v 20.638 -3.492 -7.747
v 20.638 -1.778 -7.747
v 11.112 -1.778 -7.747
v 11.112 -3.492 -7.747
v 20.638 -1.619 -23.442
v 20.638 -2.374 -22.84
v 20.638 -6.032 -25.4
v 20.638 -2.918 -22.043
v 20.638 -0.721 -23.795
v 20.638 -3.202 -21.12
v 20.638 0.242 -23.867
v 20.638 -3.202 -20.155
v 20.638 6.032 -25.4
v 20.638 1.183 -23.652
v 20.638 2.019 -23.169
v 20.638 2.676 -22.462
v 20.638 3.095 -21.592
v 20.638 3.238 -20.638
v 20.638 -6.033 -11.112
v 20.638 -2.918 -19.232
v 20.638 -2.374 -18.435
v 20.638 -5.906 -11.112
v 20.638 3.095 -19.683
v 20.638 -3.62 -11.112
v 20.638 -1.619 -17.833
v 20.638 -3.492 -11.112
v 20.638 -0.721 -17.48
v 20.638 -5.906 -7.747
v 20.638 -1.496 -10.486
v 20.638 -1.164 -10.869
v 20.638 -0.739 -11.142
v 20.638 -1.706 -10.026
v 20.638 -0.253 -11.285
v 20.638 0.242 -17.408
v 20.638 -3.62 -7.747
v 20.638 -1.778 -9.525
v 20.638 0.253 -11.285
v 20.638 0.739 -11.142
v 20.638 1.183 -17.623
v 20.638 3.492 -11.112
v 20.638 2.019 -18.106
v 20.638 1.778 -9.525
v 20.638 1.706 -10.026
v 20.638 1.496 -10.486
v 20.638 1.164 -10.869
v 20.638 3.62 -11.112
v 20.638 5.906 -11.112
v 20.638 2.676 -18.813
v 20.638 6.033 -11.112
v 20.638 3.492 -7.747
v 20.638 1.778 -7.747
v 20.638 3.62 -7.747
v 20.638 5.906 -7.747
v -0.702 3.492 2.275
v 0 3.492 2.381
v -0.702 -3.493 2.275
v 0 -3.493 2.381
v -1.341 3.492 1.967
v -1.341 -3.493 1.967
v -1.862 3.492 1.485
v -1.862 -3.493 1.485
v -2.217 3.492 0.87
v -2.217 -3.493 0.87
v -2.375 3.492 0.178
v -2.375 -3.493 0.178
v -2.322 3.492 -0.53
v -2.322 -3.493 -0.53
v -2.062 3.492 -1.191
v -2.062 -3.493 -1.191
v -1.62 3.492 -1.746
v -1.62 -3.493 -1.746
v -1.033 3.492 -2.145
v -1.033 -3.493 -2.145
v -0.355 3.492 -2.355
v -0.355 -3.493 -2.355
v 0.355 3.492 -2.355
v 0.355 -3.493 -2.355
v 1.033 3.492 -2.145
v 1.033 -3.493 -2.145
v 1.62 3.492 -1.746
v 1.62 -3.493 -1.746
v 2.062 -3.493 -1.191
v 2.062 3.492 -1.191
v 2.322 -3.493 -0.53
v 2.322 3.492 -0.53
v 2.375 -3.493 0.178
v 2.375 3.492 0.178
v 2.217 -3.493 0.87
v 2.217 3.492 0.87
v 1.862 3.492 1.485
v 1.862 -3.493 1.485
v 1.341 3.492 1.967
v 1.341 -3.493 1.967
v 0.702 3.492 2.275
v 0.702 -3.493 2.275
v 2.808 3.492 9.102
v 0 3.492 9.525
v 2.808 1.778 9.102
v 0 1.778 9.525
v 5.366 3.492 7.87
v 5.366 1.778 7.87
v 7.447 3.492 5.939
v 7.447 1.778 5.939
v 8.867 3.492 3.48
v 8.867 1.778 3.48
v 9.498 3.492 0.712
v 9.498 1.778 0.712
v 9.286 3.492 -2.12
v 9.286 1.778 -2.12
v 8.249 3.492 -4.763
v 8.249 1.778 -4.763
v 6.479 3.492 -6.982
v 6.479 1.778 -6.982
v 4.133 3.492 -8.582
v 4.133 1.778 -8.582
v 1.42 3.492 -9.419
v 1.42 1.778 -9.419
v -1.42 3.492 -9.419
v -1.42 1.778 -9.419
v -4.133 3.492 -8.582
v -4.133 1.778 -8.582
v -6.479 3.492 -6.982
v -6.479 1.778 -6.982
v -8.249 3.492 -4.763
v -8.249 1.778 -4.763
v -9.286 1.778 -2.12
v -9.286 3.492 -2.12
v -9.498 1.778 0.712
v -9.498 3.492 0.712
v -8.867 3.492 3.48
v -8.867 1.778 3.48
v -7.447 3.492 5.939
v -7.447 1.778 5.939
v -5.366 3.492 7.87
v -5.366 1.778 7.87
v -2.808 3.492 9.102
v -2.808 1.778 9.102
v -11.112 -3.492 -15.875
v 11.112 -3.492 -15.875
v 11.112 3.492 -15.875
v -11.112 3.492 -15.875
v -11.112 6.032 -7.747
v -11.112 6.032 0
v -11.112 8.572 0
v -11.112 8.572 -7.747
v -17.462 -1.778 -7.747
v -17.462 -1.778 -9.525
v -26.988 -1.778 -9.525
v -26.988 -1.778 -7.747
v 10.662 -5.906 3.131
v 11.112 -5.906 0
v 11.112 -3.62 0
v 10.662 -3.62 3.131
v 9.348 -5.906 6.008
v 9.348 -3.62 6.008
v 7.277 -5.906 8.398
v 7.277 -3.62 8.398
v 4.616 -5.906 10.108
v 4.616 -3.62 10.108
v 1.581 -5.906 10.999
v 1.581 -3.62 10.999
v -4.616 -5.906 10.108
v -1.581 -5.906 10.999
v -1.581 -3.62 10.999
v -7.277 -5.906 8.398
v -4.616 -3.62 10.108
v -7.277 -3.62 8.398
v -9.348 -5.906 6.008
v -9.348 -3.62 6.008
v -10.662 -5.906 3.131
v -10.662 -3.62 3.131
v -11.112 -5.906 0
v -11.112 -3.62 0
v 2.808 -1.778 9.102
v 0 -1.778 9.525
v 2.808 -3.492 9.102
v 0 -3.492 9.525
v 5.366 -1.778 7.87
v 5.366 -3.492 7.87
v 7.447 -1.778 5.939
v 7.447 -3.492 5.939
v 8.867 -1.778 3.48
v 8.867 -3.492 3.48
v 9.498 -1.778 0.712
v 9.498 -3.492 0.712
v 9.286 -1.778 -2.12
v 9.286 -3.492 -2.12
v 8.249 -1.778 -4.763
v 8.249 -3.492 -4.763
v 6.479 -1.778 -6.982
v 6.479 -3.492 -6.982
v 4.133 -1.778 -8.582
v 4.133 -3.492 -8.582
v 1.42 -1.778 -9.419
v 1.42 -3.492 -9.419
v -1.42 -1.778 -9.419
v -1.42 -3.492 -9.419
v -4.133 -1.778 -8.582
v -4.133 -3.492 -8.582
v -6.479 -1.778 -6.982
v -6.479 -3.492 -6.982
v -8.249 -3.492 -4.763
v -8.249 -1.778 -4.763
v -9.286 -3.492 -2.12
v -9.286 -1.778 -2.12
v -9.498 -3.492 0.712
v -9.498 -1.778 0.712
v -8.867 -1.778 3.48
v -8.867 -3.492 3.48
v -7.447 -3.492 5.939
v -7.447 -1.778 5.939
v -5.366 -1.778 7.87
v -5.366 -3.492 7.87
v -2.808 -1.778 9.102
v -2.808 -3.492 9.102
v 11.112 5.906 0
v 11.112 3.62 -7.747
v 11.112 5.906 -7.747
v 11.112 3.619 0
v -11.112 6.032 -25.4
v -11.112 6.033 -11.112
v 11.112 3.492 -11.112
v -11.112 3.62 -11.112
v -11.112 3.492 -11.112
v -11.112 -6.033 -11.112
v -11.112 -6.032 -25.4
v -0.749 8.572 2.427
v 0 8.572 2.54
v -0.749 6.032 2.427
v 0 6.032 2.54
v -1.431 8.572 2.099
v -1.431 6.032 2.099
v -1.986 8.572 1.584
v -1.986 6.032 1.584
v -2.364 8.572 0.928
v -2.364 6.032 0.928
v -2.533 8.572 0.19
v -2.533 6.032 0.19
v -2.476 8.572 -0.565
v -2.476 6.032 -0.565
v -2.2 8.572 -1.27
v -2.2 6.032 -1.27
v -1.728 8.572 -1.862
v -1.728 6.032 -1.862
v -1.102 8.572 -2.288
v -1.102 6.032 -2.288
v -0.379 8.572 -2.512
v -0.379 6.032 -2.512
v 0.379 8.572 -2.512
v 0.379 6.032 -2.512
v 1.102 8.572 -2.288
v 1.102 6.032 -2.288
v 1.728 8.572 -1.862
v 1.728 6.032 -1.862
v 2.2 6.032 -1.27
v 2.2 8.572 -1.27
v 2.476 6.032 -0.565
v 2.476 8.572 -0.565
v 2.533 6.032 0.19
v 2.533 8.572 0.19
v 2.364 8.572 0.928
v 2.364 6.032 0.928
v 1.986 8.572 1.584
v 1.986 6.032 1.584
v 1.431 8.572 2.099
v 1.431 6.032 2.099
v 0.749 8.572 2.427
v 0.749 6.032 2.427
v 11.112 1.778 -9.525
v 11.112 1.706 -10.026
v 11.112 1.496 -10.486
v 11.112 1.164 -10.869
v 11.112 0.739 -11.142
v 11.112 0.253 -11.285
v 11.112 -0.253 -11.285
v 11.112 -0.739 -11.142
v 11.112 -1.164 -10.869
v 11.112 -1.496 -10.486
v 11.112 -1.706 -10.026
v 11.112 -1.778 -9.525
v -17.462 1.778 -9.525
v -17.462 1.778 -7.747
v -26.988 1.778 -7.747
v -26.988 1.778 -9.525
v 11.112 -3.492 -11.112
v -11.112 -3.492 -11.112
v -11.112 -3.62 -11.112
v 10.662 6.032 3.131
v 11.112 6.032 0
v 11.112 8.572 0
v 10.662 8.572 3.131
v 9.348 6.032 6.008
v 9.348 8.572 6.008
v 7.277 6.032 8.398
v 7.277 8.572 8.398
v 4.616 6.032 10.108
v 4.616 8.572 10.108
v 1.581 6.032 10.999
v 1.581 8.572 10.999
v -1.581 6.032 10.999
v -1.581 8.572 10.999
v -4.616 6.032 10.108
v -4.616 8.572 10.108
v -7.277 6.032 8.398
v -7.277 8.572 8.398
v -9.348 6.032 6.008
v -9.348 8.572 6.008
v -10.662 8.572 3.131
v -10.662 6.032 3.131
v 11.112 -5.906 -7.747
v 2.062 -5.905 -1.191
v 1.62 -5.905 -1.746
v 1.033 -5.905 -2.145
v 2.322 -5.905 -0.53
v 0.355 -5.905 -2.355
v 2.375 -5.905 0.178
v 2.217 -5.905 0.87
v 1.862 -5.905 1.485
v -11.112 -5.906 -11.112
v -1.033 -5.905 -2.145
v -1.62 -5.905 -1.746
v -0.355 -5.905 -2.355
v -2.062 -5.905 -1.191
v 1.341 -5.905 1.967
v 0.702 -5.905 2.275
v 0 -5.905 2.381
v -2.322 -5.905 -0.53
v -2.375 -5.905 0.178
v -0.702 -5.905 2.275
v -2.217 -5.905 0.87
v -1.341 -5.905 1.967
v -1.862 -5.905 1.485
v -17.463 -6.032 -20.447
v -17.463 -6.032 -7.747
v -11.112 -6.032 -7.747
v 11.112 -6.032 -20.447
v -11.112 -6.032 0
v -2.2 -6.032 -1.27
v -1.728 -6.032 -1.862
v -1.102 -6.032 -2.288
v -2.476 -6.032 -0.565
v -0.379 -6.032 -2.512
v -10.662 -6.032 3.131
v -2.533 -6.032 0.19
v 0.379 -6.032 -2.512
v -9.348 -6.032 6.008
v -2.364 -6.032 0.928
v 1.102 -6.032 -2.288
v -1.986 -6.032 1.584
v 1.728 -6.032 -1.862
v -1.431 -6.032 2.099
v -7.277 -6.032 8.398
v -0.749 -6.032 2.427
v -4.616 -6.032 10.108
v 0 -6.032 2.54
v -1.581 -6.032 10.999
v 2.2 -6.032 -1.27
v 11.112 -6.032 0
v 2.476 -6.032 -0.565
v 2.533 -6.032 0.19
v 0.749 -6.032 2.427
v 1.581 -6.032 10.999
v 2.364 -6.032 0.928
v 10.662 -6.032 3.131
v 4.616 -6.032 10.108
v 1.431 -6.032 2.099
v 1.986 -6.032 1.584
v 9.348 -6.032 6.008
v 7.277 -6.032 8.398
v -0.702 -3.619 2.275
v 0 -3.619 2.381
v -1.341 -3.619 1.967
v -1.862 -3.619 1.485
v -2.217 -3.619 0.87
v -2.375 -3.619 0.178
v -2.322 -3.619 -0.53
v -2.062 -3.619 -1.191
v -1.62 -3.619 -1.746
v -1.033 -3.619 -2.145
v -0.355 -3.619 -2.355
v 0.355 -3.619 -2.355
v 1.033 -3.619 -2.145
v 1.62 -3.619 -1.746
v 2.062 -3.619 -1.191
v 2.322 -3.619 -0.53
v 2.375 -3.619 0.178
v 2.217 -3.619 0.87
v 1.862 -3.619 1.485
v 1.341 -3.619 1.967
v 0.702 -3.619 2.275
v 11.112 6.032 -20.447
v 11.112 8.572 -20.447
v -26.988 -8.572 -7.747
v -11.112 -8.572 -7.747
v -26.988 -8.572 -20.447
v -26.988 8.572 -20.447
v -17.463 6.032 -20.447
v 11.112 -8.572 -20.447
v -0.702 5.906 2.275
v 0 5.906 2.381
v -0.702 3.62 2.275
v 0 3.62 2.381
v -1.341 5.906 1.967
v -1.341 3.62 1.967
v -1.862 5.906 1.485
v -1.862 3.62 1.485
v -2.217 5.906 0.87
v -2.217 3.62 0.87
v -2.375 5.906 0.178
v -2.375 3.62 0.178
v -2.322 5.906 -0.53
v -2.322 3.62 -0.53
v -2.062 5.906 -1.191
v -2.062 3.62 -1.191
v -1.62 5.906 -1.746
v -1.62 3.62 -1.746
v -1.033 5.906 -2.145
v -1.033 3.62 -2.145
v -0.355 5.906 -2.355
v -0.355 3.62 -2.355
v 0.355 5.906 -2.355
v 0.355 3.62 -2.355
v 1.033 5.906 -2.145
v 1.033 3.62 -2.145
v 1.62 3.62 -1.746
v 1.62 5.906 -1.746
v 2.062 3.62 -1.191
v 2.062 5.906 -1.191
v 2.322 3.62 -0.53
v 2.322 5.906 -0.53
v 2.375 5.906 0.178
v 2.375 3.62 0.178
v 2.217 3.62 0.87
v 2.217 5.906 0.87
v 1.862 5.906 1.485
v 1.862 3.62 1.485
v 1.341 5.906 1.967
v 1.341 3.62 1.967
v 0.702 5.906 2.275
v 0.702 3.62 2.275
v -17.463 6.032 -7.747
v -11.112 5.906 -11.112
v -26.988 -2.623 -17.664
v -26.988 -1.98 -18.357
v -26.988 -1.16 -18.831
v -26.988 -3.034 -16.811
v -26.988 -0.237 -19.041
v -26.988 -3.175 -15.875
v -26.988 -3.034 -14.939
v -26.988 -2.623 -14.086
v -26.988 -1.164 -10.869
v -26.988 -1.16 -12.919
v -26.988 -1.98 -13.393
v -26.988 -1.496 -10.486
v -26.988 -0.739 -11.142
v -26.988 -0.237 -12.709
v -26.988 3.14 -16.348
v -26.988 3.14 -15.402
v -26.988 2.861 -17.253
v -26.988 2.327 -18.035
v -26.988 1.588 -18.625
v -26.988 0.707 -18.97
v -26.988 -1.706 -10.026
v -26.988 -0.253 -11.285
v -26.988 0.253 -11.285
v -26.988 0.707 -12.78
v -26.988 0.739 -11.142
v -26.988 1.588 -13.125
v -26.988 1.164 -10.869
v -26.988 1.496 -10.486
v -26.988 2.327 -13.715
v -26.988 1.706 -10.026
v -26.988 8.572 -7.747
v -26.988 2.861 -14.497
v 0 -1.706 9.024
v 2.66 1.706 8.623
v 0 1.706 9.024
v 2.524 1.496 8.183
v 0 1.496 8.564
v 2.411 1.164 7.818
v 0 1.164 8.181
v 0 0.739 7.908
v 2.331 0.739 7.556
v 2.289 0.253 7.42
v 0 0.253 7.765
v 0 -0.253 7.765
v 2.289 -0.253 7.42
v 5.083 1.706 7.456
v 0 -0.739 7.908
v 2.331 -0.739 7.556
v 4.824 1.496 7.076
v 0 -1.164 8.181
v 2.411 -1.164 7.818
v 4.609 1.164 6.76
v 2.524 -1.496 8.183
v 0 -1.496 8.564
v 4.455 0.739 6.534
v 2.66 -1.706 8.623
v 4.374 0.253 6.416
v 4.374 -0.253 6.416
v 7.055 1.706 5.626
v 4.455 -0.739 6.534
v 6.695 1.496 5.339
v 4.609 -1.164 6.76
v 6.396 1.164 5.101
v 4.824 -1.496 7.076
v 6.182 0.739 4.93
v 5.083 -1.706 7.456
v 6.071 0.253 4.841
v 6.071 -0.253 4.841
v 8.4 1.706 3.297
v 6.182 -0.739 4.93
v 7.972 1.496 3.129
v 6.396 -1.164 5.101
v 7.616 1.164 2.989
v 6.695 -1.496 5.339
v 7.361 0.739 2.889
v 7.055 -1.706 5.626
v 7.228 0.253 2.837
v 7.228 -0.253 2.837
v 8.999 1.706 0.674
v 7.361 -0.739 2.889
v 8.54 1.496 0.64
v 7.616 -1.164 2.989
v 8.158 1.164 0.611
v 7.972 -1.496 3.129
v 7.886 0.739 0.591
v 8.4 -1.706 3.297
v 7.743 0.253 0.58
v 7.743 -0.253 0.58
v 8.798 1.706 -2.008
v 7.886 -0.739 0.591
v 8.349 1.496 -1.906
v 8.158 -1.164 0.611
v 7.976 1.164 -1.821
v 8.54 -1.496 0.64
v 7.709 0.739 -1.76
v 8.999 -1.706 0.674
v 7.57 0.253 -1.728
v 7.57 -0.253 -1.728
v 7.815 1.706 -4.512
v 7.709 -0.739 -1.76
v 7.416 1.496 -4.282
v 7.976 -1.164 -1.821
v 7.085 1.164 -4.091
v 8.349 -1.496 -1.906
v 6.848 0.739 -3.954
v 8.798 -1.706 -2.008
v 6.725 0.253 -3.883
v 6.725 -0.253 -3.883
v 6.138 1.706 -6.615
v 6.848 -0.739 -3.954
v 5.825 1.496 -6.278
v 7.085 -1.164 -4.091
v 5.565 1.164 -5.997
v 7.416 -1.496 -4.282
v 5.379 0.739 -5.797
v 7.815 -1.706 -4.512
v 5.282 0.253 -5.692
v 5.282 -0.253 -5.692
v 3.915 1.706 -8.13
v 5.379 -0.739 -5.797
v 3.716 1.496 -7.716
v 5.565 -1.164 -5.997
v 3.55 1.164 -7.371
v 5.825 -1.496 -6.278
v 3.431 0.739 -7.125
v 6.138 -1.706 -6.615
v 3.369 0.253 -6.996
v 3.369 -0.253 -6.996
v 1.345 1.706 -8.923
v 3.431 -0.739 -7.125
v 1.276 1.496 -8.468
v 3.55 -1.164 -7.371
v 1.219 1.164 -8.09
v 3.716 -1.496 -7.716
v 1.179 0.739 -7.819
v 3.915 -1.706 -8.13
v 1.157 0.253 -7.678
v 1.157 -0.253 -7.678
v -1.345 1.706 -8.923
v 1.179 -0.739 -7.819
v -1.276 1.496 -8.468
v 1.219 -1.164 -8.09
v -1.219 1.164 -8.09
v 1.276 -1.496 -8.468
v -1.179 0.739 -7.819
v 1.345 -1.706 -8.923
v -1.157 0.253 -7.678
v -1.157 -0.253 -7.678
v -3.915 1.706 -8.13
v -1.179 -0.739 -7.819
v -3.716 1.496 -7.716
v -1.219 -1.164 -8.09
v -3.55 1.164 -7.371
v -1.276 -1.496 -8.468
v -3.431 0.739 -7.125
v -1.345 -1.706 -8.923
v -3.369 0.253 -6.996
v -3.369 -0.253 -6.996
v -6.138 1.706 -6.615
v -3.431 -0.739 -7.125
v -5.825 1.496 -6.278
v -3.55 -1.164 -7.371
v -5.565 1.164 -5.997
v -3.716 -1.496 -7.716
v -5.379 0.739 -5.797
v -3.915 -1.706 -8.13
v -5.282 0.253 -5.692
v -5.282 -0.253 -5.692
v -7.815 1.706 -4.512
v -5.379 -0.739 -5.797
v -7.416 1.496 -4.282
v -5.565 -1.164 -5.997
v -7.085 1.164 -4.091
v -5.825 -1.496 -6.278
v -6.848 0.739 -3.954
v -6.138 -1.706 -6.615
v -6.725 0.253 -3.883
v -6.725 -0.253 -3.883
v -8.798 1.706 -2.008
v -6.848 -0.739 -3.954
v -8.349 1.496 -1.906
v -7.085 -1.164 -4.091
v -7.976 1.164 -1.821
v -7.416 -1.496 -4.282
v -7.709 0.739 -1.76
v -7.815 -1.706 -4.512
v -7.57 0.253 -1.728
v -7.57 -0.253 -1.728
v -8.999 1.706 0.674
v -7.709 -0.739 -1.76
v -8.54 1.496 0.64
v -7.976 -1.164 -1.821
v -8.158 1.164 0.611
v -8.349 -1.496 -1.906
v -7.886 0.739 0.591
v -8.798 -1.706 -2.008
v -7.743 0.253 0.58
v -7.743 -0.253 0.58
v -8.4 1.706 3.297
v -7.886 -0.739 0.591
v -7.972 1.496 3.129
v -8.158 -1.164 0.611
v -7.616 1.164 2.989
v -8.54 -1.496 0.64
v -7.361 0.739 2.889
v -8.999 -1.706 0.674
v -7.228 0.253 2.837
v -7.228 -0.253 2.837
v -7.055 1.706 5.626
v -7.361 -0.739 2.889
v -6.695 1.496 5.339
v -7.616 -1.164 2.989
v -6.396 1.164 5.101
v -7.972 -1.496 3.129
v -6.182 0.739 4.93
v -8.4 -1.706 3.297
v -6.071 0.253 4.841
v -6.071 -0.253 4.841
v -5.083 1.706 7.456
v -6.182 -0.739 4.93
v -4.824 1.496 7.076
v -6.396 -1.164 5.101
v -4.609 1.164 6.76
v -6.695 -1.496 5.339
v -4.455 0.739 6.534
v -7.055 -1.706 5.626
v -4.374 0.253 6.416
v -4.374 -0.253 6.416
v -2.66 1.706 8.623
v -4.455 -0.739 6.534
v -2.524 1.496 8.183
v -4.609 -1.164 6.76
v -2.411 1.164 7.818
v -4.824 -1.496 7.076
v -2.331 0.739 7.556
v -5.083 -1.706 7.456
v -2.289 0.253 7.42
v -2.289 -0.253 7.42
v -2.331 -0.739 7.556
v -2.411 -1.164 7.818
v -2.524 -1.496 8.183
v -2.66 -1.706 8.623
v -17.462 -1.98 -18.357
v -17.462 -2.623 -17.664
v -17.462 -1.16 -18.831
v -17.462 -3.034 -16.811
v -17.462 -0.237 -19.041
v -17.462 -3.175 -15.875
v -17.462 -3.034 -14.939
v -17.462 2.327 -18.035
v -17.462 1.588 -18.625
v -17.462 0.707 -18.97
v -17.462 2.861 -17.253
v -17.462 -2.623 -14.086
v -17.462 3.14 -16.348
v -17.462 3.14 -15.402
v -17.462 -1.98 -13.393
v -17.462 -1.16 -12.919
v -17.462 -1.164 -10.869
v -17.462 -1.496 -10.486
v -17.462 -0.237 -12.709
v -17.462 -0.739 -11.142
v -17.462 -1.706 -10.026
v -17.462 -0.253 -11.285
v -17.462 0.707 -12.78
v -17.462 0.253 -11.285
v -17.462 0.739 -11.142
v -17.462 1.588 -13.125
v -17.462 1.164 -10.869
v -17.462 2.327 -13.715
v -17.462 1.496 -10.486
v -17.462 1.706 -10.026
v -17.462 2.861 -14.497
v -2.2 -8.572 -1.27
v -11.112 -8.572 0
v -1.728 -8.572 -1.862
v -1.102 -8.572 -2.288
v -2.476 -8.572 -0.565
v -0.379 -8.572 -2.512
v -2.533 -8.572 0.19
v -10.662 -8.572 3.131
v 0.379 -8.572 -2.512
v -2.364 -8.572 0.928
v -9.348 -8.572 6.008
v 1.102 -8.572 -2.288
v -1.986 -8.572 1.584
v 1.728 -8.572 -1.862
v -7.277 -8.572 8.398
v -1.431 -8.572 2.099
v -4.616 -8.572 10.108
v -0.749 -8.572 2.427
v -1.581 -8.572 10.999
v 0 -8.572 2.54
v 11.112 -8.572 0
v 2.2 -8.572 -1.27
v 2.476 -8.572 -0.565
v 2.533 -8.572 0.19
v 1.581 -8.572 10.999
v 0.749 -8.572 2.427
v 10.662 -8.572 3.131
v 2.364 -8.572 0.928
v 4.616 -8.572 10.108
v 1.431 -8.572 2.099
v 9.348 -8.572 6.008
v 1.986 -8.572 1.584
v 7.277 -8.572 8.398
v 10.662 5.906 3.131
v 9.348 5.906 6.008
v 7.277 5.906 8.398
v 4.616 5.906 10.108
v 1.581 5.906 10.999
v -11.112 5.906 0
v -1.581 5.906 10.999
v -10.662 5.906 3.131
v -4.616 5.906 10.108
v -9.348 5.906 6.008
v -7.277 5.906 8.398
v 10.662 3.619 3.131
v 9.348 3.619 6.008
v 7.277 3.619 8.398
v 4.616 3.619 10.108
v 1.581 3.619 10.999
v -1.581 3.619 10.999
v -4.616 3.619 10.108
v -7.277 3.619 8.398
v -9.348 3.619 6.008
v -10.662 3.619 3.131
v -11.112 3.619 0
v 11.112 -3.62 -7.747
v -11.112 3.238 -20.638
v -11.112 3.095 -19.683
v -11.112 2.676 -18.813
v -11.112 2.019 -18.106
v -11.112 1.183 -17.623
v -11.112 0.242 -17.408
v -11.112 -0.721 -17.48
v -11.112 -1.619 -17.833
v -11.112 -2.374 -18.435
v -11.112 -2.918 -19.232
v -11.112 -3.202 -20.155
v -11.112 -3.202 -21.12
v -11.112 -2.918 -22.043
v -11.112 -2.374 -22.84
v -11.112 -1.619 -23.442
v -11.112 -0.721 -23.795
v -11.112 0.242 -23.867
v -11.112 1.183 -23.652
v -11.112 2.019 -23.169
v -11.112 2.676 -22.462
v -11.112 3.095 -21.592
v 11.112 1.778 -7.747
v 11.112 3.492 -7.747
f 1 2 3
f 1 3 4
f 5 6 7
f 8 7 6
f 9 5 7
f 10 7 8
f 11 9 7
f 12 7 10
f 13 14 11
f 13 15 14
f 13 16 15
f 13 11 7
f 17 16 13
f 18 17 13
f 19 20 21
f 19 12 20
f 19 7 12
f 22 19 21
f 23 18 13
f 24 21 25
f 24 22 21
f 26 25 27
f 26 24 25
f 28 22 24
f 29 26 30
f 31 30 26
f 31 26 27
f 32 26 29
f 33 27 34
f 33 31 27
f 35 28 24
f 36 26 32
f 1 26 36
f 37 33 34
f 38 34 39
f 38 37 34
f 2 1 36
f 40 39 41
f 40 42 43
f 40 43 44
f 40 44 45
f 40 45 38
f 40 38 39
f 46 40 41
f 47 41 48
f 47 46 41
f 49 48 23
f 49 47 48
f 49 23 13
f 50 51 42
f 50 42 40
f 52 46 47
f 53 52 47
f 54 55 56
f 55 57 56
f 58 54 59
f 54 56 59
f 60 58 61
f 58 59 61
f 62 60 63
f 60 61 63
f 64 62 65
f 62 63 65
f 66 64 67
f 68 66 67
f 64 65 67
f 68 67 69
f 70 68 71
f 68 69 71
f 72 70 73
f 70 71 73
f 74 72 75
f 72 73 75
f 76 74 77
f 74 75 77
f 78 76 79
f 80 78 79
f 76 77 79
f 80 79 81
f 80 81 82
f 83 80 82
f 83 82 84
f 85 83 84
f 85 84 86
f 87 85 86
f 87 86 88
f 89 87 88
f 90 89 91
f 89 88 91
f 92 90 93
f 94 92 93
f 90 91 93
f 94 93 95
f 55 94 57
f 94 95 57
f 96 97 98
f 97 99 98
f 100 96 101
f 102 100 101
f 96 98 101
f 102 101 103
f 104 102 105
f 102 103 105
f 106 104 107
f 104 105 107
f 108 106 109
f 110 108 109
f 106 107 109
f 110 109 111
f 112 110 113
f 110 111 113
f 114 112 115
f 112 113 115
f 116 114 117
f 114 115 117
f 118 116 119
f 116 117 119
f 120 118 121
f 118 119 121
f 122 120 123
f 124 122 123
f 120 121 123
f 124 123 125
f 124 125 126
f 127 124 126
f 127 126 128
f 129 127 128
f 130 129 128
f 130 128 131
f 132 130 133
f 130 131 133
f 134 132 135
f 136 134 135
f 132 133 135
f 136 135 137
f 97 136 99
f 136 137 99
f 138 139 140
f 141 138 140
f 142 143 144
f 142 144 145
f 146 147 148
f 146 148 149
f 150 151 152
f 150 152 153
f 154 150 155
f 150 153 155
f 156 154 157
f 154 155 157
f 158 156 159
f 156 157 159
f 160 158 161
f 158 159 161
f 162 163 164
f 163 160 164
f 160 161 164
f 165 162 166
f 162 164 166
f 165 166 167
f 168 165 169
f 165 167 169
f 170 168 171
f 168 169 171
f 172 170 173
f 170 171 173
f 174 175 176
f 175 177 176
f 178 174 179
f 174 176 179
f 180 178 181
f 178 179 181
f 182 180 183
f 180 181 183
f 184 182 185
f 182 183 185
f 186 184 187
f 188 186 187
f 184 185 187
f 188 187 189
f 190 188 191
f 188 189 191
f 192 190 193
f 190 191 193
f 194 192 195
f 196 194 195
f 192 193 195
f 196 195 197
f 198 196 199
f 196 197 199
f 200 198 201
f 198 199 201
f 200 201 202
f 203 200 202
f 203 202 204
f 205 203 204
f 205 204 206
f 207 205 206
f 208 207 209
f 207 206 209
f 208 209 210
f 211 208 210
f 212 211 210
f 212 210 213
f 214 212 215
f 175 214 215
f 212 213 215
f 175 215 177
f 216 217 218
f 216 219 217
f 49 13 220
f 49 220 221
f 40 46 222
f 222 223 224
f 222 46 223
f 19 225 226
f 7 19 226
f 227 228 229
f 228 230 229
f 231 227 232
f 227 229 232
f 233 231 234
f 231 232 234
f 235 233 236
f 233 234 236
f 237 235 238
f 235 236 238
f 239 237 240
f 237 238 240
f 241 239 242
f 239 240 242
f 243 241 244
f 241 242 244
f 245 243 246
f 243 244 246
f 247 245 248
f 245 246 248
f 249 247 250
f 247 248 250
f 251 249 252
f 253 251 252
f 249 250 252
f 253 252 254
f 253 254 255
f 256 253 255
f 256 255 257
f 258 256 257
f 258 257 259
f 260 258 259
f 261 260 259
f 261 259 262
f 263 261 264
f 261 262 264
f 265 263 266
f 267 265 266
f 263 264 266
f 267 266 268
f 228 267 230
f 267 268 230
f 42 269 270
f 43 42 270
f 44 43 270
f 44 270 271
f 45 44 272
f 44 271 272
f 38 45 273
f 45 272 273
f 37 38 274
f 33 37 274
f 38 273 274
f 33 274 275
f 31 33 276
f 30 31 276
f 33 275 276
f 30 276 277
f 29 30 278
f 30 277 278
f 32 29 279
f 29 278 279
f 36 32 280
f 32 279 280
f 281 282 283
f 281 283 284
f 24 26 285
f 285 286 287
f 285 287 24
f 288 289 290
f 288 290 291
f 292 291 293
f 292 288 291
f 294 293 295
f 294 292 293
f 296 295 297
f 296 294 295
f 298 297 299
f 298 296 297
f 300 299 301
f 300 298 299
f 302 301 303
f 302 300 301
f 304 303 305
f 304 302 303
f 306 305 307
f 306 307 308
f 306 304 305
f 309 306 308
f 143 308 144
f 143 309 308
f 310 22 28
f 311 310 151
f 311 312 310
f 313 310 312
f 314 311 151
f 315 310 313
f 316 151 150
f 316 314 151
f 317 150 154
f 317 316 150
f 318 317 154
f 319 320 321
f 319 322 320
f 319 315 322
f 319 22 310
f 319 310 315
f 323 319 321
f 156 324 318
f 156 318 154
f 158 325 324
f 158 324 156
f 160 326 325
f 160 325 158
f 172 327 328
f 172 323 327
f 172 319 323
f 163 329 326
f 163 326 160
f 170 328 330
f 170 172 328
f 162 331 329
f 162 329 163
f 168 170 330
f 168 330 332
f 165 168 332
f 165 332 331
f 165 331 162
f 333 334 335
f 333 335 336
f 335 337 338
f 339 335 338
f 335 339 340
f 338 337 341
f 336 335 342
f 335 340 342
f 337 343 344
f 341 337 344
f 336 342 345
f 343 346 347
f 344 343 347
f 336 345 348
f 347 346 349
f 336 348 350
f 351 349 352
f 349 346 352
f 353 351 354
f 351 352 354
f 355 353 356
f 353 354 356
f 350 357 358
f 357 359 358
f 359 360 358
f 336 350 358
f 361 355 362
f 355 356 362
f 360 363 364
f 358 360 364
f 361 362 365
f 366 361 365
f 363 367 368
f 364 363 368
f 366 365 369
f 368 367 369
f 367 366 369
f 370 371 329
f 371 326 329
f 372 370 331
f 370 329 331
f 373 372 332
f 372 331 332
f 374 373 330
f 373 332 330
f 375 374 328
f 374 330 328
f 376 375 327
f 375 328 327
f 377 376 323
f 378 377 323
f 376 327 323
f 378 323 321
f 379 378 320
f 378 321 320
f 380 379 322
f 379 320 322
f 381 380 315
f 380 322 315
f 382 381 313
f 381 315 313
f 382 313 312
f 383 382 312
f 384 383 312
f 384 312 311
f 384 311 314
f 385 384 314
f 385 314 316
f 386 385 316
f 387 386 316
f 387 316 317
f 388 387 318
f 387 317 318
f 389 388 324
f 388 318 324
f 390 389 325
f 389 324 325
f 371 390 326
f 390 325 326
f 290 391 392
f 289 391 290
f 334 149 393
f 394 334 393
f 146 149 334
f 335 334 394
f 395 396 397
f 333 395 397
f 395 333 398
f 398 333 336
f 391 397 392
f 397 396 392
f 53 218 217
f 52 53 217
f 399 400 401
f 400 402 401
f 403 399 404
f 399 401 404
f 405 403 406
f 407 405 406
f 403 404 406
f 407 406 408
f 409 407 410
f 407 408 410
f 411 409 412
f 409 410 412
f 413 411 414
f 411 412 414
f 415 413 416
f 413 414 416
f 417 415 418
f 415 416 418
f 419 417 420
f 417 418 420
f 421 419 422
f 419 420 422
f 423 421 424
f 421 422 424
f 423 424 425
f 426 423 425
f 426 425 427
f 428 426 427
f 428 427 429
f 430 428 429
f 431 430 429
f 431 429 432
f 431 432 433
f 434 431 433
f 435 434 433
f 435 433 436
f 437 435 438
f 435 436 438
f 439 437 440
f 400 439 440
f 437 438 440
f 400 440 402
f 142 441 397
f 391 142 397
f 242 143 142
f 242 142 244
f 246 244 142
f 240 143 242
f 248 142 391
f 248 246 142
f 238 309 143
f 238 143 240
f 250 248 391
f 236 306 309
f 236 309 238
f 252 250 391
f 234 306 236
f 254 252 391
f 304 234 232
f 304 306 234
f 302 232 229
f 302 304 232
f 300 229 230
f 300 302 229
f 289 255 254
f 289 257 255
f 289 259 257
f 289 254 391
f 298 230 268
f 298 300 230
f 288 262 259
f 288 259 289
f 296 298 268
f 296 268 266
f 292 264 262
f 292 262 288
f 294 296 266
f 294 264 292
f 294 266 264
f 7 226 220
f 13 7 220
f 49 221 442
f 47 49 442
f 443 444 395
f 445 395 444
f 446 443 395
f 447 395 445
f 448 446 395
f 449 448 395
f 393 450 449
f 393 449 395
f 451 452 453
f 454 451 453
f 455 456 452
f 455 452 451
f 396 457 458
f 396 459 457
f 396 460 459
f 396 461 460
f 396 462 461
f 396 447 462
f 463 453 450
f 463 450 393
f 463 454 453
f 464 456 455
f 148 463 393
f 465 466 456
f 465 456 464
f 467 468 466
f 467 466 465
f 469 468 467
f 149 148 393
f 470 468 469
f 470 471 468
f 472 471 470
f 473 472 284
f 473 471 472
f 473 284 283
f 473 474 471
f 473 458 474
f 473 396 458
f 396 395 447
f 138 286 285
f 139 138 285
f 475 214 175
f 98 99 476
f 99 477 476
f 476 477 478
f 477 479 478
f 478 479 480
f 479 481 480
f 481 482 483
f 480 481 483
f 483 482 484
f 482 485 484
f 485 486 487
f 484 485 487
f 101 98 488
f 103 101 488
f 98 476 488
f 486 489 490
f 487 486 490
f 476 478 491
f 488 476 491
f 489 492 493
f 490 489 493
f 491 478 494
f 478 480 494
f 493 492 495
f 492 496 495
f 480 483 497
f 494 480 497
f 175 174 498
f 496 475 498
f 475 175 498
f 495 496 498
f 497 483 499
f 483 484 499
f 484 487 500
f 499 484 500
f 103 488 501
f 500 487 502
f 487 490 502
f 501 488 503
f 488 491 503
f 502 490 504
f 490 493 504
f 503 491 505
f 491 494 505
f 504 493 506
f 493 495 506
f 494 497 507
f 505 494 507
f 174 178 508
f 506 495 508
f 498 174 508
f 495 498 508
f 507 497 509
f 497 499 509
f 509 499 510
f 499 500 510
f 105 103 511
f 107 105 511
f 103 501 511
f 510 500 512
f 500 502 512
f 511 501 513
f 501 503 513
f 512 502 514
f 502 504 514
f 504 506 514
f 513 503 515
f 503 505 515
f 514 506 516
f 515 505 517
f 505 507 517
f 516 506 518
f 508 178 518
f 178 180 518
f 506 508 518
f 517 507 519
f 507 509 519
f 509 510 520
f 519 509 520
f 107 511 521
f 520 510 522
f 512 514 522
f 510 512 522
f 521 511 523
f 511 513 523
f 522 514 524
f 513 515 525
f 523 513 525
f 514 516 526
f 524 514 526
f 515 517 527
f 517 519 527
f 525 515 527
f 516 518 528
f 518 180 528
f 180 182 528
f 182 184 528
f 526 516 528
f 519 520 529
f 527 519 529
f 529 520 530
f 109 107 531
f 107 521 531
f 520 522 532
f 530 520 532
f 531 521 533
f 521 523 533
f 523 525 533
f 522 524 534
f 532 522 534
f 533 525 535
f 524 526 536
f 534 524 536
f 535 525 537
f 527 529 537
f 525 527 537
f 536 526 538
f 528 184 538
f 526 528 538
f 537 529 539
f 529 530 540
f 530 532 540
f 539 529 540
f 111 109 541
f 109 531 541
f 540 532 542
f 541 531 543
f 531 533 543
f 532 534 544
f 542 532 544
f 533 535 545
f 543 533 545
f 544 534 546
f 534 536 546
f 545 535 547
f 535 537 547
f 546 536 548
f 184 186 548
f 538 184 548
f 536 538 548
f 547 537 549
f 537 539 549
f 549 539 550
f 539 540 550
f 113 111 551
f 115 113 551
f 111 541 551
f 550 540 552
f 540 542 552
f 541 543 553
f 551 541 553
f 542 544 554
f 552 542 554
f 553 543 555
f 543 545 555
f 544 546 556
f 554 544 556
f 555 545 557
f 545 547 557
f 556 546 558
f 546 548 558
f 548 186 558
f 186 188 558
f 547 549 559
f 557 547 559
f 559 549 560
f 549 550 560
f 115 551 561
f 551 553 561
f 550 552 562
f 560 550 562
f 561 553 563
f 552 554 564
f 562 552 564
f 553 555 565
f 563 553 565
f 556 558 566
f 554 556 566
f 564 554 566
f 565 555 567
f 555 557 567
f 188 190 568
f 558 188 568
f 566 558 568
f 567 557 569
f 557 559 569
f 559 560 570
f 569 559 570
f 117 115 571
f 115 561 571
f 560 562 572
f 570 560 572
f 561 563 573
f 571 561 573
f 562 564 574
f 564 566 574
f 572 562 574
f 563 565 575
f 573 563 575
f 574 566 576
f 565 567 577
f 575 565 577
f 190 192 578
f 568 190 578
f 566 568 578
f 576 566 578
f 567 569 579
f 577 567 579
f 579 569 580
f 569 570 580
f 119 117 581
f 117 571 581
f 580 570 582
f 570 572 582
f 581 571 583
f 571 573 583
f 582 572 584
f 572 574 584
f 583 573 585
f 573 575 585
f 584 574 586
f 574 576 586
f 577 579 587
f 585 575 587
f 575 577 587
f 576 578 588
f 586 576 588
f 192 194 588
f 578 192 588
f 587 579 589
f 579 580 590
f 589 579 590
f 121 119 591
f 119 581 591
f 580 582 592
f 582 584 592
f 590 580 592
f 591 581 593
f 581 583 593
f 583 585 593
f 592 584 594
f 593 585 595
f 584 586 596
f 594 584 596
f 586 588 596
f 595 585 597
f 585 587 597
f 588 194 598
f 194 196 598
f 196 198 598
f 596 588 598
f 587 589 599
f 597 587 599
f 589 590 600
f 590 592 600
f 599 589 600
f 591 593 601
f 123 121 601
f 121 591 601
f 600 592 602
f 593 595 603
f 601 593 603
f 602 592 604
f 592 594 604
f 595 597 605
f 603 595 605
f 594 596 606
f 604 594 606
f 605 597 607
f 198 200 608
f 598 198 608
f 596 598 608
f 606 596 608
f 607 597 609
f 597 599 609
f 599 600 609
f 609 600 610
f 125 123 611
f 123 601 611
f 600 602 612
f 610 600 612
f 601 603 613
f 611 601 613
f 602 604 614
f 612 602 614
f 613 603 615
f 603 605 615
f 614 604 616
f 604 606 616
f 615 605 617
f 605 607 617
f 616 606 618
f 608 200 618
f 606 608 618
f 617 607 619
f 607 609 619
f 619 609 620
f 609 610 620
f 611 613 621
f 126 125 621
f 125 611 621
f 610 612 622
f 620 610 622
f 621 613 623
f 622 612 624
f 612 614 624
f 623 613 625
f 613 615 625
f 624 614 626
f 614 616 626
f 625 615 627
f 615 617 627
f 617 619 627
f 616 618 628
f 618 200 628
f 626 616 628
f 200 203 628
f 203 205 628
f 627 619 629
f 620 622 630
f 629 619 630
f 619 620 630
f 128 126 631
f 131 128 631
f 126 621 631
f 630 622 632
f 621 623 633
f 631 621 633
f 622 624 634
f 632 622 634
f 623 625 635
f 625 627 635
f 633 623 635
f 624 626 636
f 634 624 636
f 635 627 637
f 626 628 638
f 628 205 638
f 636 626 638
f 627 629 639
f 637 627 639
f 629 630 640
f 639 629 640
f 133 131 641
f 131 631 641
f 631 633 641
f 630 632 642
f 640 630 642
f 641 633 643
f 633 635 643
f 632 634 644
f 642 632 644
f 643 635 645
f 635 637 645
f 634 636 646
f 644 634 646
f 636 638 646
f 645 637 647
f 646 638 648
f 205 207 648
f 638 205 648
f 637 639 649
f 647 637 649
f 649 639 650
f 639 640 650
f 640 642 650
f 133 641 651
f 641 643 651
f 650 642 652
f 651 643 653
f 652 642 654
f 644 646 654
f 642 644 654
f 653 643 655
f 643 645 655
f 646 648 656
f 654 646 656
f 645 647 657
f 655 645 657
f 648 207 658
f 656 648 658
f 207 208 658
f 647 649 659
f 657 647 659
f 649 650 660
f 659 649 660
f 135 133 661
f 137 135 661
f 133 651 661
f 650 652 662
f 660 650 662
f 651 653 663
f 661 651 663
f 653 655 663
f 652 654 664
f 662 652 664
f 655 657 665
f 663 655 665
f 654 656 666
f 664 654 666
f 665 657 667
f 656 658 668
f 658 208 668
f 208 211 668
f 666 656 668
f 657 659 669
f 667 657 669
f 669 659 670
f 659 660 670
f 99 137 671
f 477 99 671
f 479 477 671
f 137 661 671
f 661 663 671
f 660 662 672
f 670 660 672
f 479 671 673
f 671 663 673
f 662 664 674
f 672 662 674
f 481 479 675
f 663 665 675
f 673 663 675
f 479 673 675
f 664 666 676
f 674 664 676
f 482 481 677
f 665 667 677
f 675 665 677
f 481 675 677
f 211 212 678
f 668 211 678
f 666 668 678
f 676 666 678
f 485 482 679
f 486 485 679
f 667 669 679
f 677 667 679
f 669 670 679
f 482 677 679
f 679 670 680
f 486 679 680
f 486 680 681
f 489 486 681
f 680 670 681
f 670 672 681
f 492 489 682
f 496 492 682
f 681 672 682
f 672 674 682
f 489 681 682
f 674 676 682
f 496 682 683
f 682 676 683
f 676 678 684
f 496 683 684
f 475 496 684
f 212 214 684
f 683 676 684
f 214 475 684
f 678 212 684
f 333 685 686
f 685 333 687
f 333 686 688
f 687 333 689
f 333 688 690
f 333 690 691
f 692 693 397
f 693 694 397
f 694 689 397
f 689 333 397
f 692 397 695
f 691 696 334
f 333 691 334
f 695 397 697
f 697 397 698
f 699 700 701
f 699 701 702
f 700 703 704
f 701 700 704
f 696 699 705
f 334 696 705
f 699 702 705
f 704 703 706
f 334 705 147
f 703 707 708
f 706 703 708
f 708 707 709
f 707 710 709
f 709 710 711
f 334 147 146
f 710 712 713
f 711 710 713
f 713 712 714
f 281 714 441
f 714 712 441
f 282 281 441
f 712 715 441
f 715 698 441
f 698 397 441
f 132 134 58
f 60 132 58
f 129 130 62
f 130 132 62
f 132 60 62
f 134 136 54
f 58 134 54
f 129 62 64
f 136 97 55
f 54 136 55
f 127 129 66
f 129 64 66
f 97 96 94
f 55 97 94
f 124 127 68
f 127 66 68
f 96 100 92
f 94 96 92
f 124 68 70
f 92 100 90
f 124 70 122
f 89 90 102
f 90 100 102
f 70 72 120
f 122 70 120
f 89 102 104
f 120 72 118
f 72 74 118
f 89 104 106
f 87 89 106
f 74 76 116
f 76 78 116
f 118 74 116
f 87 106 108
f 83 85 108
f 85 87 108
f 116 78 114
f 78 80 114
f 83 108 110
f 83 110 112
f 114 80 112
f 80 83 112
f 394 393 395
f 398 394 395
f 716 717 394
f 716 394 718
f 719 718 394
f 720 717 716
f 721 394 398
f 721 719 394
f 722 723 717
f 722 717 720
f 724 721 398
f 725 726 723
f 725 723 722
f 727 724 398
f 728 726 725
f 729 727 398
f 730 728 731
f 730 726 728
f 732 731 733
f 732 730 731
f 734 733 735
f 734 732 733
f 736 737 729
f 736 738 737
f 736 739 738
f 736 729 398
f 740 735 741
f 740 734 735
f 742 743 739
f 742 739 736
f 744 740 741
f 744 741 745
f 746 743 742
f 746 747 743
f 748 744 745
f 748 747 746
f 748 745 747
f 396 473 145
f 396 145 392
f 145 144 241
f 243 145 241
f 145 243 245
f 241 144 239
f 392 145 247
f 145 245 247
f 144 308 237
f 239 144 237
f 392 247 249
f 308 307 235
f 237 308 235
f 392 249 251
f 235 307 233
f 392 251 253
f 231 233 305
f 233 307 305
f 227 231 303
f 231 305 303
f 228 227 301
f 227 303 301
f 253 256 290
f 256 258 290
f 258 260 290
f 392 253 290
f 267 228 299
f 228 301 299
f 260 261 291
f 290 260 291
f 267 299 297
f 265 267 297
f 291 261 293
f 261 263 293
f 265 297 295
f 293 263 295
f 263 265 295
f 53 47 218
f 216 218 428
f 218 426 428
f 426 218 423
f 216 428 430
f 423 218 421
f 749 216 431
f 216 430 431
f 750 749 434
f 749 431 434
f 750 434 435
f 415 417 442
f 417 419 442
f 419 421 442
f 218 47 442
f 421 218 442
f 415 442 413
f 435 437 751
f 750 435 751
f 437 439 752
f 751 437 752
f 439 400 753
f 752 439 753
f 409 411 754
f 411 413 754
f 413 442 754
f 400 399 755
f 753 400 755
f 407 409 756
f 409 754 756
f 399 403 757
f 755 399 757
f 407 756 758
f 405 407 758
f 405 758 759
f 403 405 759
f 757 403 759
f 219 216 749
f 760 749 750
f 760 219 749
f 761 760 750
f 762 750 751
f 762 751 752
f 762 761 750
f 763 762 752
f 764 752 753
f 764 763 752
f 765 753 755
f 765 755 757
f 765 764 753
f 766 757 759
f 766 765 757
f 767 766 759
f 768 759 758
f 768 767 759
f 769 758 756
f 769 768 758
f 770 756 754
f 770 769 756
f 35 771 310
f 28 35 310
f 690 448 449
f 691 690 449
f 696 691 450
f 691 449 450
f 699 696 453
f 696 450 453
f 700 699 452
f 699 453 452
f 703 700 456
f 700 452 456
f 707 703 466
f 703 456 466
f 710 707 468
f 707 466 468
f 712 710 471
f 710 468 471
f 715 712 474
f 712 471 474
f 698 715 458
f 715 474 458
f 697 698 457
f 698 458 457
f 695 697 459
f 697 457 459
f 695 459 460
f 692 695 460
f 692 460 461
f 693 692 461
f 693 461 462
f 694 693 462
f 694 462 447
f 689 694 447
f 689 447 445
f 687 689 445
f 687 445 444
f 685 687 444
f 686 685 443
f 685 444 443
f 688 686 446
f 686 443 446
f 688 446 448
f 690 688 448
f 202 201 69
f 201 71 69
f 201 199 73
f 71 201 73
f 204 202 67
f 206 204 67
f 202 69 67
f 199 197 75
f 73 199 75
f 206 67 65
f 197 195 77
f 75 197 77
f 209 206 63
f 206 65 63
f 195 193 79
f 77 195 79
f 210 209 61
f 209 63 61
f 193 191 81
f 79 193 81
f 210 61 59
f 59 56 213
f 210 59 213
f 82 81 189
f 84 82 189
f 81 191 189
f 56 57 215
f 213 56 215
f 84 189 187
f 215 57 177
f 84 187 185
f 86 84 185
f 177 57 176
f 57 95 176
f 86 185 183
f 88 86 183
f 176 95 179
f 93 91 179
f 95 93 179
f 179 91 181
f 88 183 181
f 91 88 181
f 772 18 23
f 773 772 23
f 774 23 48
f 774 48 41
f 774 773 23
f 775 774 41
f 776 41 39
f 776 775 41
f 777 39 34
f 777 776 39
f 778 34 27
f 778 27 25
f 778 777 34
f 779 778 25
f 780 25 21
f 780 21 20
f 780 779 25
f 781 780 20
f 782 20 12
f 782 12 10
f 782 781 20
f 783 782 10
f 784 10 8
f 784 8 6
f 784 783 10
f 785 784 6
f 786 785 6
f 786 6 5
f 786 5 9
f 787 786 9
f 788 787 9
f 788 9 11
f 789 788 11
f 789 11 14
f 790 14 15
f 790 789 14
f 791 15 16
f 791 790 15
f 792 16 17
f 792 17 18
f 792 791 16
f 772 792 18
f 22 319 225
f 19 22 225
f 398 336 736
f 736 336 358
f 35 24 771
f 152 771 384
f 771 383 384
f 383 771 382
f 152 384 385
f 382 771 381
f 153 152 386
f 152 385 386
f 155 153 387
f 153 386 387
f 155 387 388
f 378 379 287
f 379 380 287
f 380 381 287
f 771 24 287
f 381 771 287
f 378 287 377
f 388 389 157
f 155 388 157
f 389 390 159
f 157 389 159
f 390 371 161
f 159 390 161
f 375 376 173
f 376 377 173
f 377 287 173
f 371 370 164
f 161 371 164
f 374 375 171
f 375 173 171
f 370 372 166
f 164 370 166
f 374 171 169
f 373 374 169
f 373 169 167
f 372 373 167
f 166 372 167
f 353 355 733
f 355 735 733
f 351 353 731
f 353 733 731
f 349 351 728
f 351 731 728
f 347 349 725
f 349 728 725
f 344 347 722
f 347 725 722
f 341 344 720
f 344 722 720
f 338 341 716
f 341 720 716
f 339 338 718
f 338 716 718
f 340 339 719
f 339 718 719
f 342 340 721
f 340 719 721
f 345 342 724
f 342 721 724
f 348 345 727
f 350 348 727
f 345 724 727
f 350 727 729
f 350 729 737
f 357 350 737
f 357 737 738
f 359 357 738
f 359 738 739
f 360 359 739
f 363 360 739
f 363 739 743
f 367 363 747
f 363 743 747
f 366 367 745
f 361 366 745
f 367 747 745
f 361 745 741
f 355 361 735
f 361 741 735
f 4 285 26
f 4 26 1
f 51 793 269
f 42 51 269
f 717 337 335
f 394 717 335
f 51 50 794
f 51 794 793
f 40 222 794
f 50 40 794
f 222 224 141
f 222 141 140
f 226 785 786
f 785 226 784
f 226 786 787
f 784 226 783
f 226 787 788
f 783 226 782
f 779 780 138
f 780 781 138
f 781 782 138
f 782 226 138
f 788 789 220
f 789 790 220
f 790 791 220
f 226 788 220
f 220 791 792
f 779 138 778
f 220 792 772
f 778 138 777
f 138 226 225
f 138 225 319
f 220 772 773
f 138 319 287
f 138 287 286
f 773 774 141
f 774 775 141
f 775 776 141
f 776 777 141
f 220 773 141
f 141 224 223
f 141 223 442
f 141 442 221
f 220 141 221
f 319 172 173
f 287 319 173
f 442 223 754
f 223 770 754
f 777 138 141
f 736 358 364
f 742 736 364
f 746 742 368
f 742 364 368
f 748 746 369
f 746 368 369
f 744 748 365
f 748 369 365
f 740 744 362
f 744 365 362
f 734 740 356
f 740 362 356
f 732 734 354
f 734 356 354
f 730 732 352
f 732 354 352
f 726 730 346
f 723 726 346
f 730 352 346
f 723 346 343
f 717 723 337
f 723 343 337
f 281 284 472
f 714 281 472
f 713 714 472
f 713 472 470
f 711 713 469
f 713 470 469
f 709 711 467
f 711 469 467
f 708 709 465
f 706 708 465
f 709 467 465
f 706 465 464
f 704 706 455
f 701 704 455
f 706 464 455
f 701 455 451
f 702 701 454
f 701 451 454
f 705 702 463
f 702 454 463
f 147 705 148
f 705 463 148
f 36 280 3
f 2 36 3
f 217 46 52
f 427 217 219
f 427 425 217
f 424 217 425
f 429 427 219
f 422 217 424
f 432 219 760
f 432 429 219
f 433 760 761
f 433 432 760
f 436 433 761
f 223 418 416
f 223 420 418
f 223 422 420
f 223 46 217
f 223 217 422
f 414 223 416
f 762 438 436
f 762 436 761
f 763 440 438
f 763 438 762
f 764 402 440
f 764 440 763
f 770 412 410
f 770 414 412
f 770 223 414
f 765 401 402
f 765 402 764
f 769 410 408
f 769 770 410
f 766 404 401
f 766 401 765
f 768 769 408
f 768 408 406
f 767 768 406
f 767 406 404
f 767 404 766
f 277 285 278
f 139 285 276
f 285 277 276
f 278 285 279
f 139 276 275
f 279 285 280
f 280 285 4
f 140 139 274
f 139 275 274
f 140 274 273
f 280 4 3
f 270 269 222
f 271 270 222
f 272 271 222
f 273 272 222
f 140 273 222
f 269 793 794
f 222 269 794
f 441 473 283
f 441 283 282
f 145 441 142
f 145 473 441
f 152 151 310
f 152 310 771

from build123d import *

# Parameters (mm, degrees)
F3_DEPTH  = 2.54
F5_W      = 12.065
F5_H      = 9.525
F6_DEPTH  = 22.225
F7_R      = 3.2385
F8_DEPTH  = 22.225
F10_DEPTH = 2.54
F12_W     = 9.525
F12_H     = 12.7
F13_DEPTH = 12.065
F15_DEPTH = 9.525
F16_R     = 3.2385
F17_DEPTH = 9.525
F18_R     = 3.175
F19_DEPTH = 9.525
F20_W     = 0.127
F20_H     = 11.1125
F22_W     = 0.127
F22_H     = 11.1125
F23_DEPTH = 31.751


with BuildPart() as f1:
    # F0 (on Right) → F1 (revolve)
    with BuildSketch(Plane.YZ):
        with BuildLine():
            Line((-3.4925, 9.525), (-3.4925, 0))
            Line((-3.4925, 0), (3.4925, 0))
            Line((3.4925, 0), (3.4925, 9.525))
            Line((3.4925, 9.525), (1.778, 9.525))
            ThreePointArc((1.778, 9.525), (0, 7.747), (-1.778, 9.525))
            Line((-1.778, 9.525), (-3.4925, 9.525))
        make_face()
    revolve(axis=Axis((0, 0, 0), (0, 1, 0)))


with BuildPart() as f3:
    # F2 (on face) → F3 (new body)
    with BuildSketch(Plane.XZ.offset(3.4925)):
        with BuildLine():
            Line((11.1125, -15.875), (11.1125, 0))
            ThreePointArc((11.1125, 0), (0, 11.1125), (-11.1125, 0))
            Line((-11.1125, 0), (-11.1125, -15.875))
            Line((-11.1125, -15.875), (11.1125, -15.875))
        make_face()
    extrude(amount=F3_DEPTH)


with BuildPart() as f4_1:
    # F4: instance of F3
    add(f3.part.mirror(Plane.XZ))


with BuildPart() as f3_1:
    add(f3.part)

    add(f4_1.part)  # F6 merges F4_1
    # F5 (on face) → F6 (join, through all)
    with BuildSketch(Plane.YZ.offset(11.1125)):
        with Locations((0, -20.6375)):
            Rectangle(F5_W, F5_H)
    extrude(amount=-F6_DEPTH)

    # F7 (on face) → F8 (cut, through all)
    with BuildSketch(Plane.YZ.offset(11.1125)):
        with Locations((0, -20.6375)):
            Circle(F7_R)
    extrude(amount=-F8_DEPTH, mode=Mode.SUBTRACT)

    # F16 (on face) → F17 (join)
    with BuildSketch(Plane.YZ.offset(11.1125)):
        with BuildLine():
            Line((1.778, -7.747), (1.778, -9.525))
            ThreePointArc((1.778, -9.525), (0, -11.303), (-1.778, -9.525))
            Line((-1.778, -9.525), (-1.778, -7.747))
            Line((-1.778, -7.747), (-6.0325, -7.747))
            Line((-6.0325, -7.747), (-6.0325, -25.4))
            Line((-6.0325, -25.4), (6.0325, -25.4))
            Line((6.0325, -25.4), (6.0325, -7.747))
            Line((6.0325, -7.747), (1.778, -7.747))
        make_face()
        with Locations((0, -20.6375)):
            Circle(F16_R, mode=Mode.SUBTRACT)
    extrude(amount=F17_DEPTH)

    # F20 (on Right) → F21 (revolve, cut)
    with BuildSketch(Plane.YZ):
        with Locations((-3.556, 5.55625)):
            Rectangle(F20_W, F20_H)
        with Locations((3.556, 5.55625)):
            Rectangle(F20_W, F20_H)
        with Locations((5.969, 5.55625)):
            Rectangle(F20_W, F20_H)
        with Locations((-5.969, 5.55625)):
            Rectangle(F20_W, F20_H)
    revolve(axis=Axis((0, -3.556, 0), (0, -1, 0)), mode=Mode.SUBTRACT)

    # F22 (on face) → F23 (cut, through all)
    with BuildSketch(Plane(origin=(-11.1125, 0, 0), x_dir=(0, -1, 0), z_dir=(-1, 0, 0))):
        with Locations((5.969, -5.55625)):
            Rectangle(F22_W, F22_H)
        with Locations((-5.969, -5.55625)):
            Rectangle(F22_W, F22_H)
        with Locations((-3.556, -5.55625)):
            Rectangle(F22_W, F22_H)
        with Locations((3.556, -5.55625)):
            Rectangle(F22_W, F22_H)
    extrude(amount=-F23_DEPTH, mode=Mode.SUBTRACT)


with BuildPart() as f10:
    # F9 (on face) → F10 (new body)
    with BuildSketch(Plane.XZ.offset(6.0325)):
        with BuildLine():
            Line((-26.9875, -20.447), (-11.1125, -20.447))
            Line((-11.1125, -20.447), (11.1125, -20.447))
            Line((11.1125, -20.447), (11.1125, 0))
            ThreePointArc((11.1125, 0), (0, 11.1125), (-11.1125, 0))
            Line((-11.1125, 0), (-11.1125, -7.747))
            Line((-11.1125, -7.747), (-26.9875, -7.747))
            Line((-26.9875, -7.747), (-26.9875, -20.447))
        make_face()
    extrude(amount=F10_DEPTH)


with BuildPart() as f11_1:
    # F11: instance of F10
    add(f10.part.mirror(Plane.XZ))


with BuildPart() as f10_1:
    add(f10.part)

    add(f11_1.part)  # F13 merges F11_1
    # F12 (on face) → F13 (join, through all)
    with BuildSketch(Plane.XZ.offset(-6.0325)):
        with Locations((-22.225, -14.097)):
            Rectangle(F12_W, F12_H)
    extrude(amount=F13_DEPTH)

    # F14 (on face) → F15 (cut, through all)
    with BuildSketch(Plane(origin=(-26.9875, 0, 0), x_dir=(0, -1, 0), z_dir=(-1, 0, 0))):
        with BuildLine():
            Line((-1.778, -7.747), (-1.778, -9.525))
            ThreePointArc((-1.778, -9.525), (0, -11.303), (1.778, -9.525))
            Line((1.778, -9.525), (1.778, -7.747))
            Line((1.778, -7.747), (-1.778, -7.747))
        make_face()
    extrude(amount=-F15_DEPTH, mode=Mode.SUBTRACT)

    # F18 (on face) → F19 (cut, through all)
    with BuildSketch(Plane(origin=(-26.9875, 0, 0), x_dir=(0, -1, 0), z_dir=(-1, 0, 0))):
        with Locations((0, -15.875)):
            Circle(F18_R)
    extrude(amount=-F19_DEPTH, mode=Mode.SUBTRACT)


with BuildPart() as f25_tool:
    # F24 (on Right) → F25 (revolve)
    with BuildSketch(Plane.YZ):
        Polygon((-8.5725, 0), (8.5725, 0), (8.5725, 2.54), (6.0325, 2.54), (6.0325, 2.38125), (-6.0325, 2.38125), (-6.0325, 2.54), (-8.5725, 2.54), align=None)
    revolve(axis=Axis((0, 0, 0), (0, -1, 0)))


with BuildPart() as f1_1:
    add(f1.part)

    # F25: cut by f25_tool
    add(f25_tool.part, mode=Mode.SUBTRACT)


with BuildPart() as f3_2:
    add(f3_1.part)

    # F25: cut by f25_tool
    add(f25_tool.part, mode=Mode.SUBTRACT)


with BuildPart() as f10_2:
    add(f10_1.part)

    # F25: cut by f25_tool
    add(f25_tool.part, mode=Mode.SUBTRACT)


solid = Compound([f1_1.part, f3_2.part, f10_2.part])
